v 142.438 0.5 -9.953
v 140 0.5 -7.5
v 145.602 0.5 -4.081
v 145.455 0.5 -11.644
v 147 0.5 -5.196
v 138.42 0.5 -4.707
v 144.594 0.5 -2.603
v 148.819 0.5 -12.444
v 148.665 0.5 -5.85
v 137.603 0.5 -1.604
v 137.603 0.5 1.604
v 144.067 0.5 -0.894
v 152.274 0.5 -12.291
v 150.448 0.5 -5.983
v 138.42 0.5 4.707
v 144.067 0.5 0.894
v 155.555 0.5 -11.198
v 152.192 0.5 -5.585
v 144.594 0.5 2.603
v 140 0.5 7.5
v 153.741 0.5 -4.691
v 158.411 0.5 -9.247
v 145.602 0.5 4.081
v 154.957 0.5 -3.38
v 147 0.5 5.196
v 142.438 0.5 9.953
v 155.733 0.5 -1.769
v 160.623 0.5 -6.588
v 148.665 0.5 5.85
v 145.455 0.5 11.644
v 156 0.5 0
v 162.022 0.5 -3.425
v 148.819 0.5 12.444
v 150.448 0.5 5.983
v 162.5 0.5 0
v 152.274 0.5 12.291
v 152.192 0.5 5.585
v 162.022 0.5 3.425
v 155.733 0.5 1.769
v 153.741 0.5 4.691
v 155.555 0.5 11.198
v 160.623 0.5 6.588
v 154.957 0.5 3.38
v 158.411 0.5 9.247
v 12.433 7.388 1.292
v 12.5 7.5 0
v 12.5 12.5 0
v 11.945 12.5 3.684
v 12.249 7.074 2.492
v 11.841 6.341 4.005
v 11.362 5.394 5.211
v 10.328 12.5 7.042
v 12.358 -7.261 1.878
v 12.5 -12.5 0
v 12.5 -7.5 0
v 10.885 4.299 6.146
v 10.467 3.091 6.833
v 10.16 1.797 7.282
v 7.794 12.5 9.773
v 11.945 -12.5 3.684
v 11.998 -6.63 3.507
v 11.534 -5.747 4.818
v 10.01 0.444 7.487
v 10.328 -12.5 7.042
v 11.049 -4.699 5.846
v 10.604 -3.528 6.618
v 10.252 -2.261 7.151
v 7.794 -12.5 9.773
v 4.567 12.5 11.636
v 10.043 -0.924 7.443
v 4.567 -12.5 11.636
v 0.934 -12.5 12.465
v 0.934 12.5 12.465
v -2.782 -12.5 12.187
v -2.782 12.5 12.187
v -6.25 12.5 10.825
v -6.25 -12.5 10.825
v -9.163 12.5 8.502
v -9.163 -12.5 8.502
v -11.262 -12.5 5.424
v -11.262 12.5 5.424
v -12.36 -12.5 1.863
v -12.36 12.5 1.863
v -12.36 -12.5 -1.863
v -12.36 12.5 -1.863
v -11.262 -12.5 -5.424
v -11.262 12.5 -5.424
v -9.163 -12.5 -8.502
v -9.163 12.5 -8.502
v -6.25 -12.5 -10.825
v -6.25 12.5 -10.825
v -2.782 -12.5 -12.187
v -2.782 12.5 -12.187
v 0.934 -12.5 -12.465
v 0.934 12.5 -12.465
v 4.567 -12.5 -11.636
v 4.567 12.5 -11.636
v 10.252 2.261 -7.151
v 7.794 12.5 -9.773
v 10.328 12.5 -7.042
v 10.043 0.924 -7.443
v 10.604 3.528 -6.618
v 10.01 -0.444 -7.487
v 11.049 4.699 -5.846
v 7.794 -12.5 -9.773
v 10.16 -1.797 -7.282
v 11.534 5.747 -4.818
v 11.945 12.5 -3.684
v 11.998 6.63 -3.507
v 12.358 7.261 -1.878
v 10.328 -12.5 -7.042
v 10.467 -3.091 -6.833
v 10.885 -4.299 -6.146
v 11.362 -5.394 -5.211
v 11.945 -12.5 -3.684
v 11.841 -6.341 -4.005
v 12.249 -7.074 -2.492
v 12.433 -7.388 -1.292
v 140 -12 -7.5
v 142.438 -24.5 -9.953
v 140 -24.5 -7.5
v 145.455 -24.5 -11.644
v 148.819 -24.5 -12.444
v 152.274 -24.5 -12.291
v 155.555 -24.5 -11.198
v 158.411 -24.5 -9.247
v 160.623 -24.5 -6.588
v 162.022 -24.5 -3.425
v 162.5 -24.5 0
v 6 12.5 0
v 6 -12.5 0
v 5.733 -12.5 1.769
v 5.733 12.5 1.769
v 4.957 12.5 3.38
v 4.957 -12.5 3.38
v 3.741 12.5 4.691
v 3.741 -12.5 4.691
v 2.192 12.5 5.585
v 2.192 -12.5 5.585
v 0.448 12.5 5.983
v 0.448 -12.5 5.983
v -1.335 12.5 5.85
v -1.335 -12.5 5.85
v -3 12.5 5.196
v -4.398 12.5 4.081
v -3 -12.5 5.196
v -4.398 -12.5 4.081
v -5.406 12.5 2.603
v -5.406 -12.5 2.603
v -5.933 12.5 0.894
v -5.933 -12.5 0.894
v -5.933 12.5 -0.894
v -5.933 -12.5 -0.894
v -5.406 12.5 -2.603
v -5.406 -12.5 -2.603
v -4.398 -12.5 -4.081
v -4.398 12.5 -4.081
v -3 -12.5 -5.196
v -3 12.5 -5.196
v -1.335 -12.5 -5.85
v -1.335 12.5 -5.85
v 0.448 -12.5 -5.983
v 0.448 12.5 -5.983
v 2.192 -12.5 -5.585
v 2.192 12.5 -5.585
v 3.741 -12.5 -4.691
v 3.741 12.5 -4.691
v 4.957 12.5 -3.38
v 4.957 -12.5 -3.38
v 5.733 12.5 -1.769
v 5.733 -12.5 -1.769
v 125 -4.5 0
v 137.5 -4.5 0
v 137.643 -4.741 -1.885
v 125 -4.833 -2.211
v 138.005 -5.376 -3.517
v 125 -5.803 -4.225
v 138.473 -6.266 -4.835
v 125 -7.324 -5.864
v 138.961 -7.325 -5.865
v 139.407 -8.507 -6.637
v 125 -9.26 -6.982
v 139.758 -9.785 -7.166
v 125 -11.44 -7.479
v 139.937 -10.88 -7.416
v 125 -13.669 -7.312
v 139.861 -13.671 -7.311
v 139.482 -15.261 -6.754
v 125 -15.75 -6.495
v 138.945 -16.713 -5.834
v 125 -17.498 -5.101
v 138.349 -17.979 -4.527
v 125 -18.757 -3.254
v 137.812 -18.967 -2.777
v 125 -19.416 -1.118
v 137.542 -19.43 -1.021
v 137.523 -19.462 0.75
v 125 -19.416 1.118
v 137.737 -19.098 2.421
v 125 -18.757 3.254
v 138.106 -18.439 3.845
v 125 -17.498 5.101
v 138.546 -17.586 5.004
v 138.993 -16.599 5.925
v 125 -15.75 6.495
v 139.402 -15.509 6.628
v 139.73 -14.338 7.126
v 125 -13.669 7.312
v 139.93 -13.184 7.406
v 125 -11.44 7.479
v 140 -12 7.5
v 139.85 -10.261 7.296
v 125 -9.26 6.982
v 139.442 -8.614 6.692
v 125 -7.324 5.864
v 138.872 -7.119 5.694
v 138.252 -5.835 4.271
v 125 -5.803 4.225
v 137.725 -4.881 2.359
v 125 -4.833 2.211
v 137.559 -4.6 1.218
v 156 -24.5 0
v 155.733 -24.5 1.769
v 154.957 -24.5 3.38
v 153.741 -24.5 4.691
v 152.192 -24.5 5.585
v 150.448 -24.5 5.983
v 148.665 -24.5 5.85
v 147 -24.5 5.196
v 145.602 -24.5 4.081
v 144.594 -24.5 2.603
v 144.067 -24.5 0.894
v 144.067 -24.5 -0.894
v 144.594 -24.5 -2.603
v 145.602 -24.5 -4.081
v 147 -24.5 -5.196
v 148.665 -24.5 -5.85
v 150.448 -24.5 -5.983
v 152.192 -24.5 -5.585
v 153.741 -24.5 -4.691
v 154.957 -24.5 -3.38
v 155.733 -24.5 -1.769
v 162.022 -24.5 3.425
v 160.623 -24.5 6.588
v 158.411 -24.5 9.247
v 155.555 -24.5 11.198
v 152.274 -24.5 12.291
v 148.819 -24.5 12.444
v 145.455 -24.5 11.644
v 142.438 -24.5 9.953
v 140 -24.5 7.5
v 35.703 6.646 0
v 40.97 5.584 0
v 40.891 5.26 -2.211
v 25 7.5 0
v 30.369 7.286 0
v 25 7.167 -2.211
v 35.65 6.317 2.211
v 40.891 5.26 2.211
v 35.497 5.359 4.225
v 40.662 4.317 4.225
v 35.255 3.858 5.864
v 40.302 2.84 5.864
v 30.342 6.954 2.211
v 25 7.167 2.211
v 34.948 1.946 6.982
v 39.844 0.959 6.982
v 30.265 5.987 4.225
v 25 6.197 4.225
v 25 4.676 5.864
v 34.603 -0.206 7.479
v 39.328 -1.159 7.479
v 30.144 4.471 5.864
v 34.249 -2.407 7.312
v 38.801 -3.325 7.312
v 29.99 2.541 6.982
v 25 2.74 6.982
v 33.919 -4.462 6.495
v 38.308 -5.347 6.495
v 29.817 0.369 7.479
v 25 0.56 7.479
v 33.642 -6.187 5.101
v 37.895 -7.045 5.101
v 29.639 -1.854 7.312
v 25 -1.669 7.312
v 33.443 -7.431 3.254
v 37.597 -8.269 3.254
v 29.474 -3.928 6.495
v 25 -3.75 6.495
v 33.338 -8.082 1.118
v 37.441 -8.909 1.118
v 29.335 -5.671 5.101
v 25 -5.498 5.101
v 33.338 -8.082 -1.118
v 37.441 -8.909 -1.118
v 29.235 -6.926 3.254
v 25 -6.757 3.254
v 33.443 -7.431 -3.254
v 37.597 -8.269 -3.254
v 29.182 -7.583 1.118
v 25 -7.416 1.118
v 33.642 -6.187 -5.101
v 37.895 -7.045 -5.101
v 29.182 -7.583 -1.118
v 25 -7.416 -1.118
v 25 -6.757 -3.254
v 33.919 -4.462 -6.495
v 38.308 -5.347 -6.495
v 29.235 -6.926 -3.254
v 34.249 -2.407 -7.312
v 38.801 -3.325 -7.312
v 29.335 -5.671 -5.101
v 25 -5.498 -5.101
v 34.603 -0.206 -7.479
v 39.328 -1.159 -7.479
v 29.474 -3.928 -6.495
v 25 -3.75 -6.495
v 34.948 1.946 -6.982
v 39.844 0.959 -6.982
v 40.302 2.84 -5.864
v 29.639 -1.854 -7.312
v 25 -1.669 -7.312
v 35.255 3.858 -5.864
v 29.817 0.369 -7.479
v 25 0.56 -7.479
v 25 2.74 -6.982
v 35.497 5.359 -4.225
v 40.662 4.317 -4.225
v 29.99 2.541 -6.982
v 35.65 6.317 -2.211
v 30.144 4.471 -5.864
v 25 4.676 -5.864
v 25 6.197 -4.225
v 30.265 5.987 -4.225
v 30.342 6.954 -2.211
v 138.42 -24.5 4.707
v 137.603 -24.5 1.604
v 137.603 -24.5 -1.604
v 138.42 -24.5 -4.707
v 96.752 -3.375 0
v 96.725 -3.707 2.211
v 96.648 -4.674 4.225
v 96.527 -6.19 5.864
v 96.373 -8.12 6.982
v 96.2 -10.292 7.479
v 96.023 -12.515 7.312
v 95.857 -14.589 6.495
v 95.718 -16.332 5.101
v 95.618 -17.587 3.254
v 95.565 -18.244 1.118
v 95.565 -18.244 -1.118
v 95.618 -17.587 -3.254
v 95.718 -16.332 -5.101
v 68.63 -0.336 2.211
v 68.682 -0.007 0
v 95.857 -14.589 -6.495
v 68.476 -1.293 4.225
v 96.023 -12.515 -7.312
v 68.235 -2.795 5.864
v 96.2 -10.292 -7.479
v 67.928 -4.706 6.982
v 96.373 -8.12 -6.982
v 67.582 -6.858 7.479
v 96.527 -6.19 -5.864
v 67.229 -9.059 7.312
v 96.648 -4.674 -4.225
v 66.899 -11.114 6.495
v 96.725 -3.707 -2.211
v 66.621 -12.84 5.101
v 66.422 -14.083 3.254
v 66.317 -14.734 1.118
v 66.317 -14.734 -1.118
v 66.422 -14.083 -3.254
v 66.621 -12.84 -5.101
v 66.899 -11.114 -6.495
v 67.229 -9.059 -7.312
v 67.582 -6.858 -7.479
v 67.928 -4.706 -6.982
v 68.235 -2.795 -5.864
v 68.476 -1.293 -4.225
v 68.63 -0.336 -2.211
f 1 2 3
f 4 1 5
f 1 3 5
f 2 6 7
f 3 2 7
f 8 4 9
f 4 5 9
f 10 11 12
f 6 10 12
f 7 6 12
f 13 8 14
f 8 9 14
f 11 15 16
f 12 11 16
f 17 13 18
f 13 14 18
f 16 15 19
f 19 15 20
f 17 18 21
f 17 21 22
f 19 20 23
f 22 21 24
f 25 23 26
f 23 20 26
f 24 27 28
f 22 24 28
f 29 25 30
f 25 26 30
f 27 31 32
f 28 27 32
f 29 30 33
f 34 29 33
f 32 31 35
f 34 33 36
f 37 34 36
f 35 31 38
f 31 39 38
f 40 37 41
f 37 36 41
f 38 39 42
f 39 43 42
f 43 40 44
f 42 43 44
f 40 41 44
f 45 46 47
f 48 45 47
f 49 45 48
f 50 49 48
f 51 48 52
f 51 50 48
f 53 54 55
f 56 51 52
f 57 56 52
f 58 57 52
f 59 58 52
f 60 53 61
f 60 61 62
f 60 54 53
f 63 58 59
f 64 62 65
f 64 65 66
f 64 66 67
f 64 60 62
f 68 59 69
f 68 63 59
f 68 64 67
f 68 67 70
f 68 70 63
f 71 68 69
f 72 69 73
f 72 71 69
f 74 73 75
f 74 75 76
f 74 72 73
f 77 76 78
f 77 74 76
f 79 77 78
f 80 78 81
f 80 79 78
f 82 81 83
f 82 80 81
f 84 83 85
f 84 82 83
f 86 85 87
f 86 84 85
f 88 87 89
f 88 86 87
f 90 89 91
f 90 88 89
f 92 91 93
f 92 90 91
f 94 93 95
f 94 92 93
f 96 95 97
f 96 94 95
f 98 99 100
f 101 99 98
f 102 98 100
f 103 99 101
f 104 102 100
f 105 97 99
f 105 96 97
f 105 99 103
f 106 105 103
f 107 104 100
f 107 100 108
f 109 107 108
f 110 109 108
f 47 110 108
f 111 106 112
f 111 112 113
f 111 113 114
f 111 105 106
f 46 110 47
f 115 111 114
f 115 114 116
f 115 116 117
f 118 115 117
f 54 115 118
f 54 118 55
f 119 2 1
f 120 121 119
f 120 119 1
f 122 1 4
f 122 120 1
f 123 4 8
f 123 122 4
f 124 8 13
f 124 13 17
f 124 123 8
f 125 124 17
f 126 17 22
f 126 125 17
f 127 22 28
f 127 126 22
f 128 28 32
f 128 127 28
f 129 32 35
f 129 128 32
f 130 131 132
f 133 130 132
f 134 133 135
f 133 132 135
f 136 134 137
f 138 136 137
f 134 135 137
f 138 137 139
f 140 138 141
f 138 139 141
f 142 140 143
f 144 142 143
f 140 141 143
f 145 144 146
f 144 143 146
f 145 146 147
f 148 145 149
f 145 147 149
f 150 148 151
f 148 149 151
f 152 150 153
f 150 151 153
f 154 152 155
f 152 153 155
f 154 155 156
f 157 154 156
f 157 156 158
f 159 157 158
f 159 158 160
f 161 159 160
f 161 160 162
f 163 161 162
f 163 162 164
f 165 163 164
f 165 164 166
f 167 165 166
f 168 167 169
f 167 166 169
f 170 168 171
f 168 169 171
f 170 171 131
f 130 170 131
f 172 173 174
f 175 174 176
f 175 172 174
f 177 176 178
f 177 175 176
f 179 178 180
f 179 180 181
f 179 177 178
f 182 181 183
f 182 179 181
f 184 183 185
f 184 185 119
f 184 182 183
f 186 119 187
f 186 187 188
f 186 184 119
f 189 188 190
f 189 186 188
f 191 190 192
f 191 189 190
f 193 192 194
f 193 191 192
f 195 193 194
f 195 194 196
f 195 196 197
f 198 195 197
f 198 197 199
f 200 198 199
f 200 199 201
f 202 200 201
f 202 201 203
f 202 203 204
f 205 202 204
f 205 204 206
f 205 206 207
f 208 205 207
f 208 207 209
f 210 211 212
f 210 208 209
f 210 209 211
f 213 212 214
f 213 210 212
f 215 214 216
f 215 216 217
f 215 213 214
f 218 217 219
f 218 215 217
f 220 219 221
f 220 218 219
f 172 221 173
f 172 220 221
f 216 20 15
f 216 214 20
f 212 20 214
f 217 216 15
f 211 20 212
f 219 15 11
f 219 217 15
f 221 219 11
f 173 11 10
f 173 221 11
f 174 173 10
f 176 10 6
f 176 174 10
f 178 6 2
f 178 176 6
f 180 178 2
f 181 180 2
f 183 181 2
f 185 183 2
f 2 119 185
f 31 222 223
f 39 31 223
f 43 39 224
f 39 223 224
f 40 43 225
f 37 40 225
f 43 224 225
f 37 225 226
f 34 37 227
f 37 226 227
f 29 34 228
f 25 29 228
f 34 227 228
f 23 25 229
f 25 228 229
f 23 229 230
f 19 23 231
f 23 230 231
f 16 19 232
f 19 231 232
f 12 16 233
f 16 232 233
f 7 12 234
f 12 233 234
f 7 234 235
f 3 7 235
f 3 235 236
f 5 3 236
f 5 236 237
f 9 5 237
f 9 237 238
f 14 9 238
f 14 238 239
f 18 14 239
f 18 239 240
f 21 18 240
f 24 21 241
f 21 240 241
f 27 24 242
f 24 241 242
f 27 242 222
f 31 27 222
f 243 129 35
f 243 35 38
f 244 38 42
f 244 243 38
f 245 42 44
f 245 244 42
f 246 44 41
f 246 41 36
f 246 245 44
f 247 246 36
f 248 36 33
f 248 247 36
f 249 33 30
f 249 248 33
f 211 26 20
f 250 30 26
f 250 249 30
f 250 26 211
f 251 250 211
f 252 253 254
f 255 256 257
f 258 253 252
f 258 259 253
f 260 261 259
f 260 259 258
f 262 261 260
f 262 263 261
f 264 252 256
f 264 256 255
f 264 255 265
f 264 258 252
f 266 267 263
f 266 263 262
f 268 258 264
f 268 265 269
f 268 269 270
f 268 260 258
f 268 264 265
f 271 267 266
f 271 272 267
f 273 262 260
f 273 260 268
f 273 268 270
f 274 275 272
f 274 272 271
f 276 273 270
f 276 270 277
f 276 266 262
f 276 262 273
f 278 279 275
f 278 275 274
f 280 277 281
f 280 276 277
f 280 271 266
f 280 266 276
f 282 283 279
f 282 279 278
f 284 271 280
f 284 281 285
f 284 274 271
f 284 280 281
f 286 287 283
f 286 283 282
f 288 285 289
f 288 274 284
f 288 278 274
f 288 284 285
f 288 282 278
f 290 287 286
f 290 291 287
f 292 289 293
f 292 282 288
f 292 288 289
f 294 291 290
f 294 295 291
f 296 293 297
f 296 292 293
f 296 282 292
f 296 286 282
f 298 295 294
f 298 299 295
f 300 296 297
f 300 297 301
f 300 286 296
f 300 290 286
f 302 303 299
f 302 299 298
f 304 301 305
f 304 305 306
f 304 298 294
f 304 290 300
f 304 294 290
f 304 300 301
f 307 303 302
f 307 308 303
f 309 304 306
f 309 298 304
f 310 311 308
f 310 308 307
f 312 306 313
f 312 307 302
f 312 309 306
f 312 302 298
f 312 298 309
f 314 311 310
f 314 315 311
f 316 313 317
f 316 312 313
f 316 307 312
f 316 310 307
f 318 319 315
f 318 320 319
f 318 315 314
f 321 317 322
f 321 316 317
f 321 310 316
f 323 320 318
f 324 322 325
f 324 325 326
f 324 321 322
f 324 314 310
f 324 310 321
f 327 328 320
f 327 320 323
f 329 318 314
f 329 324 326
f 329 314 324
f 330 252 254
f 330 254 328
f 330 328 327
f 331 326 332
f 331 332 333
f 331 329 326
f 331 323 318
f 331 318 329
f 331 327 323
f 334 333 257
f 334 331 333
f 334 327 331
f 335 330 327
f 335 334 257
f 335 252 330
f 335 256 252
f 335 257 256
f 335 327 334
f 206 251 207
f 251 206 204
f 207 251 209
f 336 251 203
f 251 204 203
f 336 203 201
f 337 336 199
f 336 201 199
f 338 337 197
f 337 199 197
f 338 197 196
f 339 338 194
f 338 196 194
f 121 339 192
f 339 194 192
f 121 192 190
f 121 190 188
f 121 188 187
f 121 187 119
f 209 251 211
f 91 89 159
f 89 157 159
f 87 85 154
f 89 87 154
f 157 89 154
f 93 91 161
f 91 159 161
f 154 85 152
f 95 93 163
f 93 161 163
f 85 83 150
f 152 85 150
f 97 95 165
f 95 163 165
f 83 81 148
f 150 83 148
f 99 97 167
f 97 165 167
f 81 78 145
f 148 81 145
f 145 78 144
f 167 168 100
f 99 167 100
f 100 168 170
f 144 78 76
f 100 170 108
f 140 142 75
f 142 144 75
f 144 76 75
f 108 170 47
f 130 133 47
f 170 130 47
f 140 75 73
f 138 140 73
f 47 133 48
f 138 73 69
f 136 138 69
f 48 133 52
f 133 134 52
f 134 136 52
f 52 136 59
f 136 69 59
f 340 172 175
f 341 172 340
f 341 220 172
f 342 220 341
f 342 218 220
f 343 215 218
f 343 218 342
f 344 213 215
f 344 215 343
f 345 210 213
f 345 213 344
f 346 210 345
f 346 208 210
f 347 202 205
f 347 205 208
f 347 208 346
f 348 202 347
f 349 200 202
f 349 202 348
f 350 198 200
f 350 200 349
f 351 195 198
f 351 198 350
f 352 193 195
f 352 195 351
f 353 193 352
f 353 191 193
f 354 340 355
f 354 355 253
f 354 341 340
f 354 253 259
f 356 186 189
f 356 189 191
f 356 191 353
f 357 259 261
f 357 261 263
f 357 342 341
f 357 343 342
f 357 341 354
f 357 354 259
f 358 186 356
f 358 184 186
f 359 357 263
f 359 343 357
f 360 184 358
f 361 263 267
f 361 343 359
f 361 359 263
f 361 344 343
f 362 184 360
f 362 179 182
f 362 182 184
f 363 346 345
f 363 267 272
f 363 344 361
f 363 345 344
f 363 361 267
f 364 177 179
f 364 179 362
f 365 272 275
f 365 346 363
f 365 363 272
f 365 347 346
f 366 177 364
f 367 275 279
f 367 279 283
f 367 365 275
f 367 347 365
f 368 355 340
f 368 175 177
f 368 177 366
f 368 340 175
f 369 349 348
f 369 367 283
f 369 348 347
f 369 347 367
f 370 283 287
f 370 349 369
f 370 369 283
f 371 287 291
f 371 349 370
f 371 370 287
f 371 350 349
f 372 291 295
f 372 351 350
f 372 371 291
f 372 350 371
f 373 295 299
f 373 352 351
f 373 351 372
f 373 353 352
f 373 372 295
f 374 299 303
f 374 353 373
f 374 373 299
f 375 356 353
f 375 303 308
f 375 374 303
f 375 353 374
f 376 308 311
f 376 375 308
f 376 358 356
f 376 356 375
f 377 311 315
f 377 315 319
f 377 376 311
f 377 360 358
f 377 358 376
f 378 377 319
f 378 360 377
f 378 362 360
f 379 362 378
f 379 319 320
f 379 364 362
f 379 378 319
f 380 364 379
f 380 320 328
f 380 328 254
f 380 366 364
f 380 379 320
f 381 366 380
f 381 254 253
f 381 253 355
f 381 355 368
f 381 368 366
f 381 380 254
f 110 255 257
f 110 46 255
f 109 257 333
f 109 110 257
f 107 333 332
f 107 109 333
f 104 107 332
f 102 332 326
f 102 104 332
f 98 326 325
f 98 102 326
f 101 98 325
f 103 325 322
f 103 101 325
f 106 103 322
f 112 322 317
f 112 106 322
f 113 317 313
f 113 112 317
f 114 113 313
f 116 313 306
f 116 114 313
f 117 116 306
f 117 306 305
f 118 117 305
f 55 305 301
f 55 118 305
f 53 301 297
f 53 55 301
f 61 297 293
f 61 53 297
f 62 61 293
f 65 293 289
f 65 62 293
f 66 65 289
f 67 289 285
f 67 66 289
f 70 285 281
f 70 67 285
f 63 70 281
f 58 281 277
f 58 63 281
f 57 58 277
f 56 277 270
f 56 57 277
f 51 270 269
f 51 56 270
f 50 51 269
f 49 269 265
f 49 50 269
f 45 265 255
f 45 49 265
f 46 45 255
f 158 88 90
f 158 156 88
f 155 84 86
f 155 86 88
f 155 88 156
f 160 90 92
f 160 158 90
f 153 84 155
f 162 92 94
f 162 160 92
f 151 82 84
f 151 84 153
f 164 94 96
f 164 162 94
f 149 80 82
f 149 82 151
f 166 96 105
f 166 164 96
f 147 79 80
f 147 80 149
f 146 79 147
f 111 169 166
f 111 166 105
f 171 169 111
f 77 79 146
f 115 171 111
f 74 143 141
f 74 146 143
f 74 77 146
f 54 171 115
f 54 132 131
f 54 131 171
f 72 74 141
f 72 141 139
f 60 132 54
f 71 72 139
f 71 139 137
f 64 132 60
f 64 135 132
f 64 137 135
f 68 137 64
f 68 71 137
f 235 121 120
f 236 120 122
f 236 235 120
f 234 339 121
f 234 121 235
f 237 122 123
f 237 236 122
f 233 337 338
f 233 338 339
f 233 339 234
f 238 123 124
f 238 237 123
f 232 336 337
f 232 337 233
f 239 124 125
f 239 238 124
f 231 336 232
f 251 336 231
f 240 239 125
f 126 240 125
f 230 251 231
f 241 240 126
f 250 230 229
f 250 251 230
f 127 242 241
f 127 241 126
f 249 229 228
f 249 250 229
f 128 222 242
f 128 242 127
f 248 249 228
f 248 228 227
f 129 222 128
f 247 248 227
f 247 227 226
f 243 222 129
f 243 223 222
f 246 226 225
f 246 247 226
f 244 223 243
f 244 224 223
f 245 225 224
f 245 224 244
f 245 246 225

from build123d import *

# Parameters (mm, degrees)
F1_R      = 7.5
F3_R      = 12.5
F4_DEPTH  = 12.5
F5_R      = 6
F6_DEPTH  = 25
F9_DEPTH  = 12.5
F10_R     = 6
F11_DEPTH = 25


with BuildPart() as f2:
    # F2: sweep along a path in F0
    with BuildLine(Plane.XY) as f2_path:
        Line((150, -12), (125, -12))
        ThreePointArc((125, -12), (81.789999989, -9.4166667579), (39.1955835962, -1.7034700315))
        ThreePointArc((39.1955835962, -1.7034700315), (32.1487132371, -0.4273896908), (25, 0))
        Line((25, 0), (0, 0))
    # F1 (on Right) → F2 (sweep)
    with BuildSketch(Plane.YZ):
        Circle(F1_R)
    sweep(path=f2_path.line)

    # F3 (on Front) → F4 (join, symmetric)
    with BuildSketch(Plane.XZ):
        Circle(F3_R)
    extrude(amount=F4_DEPTH, both=True)

    # F5 (on face) → F6 (cut)
    with BuildSketch(Plane.XZ.offset(12.5)):
        Circle(F5_R)
    extrude(amount=-F6_DEPTH, mode=Mode.SUBTRACT)

    # F8 (on offset) → F9 (join, symmetric)
    with BuildSketch(Plane.XZ.offset(12)):
        with BuildLine():
            Line((150, 7.5), (150, -7.5))
            Line((150, -7.5), (140, -7.5))
            ThreePointArc((140, -7.5), (153.9528470752, -11.8585412256), (162.5, 0))
            ThreePointArc((162.5, 0), (153.9528470752, 11.8585412256), (140, 7.5))
            Line((140, 7.5), (150, 7.5))
        make_face()
        with BuildLine():
            Line((140, -7.5), (150, -7.5))
            Line((150, -7.5), (150, 7.5))
            Line((150, 7.5), (140, 7.5))
            ThreePointArc((140, 7.5), (137.5, 0), (140, -7.5))
        make_face()
    extrude(amount=F9_DEPTH, both=True)

    # F10 (on face) → F11 (cut)
    with BuildSketch(Plane.XZ.offset(24.5)):
        with Locations((150, 0)):
            Circle(F10_R)
    extrude(amount=-F11_DEPTH, mode=Mode.SUBTRACT)


solid = f2.part
